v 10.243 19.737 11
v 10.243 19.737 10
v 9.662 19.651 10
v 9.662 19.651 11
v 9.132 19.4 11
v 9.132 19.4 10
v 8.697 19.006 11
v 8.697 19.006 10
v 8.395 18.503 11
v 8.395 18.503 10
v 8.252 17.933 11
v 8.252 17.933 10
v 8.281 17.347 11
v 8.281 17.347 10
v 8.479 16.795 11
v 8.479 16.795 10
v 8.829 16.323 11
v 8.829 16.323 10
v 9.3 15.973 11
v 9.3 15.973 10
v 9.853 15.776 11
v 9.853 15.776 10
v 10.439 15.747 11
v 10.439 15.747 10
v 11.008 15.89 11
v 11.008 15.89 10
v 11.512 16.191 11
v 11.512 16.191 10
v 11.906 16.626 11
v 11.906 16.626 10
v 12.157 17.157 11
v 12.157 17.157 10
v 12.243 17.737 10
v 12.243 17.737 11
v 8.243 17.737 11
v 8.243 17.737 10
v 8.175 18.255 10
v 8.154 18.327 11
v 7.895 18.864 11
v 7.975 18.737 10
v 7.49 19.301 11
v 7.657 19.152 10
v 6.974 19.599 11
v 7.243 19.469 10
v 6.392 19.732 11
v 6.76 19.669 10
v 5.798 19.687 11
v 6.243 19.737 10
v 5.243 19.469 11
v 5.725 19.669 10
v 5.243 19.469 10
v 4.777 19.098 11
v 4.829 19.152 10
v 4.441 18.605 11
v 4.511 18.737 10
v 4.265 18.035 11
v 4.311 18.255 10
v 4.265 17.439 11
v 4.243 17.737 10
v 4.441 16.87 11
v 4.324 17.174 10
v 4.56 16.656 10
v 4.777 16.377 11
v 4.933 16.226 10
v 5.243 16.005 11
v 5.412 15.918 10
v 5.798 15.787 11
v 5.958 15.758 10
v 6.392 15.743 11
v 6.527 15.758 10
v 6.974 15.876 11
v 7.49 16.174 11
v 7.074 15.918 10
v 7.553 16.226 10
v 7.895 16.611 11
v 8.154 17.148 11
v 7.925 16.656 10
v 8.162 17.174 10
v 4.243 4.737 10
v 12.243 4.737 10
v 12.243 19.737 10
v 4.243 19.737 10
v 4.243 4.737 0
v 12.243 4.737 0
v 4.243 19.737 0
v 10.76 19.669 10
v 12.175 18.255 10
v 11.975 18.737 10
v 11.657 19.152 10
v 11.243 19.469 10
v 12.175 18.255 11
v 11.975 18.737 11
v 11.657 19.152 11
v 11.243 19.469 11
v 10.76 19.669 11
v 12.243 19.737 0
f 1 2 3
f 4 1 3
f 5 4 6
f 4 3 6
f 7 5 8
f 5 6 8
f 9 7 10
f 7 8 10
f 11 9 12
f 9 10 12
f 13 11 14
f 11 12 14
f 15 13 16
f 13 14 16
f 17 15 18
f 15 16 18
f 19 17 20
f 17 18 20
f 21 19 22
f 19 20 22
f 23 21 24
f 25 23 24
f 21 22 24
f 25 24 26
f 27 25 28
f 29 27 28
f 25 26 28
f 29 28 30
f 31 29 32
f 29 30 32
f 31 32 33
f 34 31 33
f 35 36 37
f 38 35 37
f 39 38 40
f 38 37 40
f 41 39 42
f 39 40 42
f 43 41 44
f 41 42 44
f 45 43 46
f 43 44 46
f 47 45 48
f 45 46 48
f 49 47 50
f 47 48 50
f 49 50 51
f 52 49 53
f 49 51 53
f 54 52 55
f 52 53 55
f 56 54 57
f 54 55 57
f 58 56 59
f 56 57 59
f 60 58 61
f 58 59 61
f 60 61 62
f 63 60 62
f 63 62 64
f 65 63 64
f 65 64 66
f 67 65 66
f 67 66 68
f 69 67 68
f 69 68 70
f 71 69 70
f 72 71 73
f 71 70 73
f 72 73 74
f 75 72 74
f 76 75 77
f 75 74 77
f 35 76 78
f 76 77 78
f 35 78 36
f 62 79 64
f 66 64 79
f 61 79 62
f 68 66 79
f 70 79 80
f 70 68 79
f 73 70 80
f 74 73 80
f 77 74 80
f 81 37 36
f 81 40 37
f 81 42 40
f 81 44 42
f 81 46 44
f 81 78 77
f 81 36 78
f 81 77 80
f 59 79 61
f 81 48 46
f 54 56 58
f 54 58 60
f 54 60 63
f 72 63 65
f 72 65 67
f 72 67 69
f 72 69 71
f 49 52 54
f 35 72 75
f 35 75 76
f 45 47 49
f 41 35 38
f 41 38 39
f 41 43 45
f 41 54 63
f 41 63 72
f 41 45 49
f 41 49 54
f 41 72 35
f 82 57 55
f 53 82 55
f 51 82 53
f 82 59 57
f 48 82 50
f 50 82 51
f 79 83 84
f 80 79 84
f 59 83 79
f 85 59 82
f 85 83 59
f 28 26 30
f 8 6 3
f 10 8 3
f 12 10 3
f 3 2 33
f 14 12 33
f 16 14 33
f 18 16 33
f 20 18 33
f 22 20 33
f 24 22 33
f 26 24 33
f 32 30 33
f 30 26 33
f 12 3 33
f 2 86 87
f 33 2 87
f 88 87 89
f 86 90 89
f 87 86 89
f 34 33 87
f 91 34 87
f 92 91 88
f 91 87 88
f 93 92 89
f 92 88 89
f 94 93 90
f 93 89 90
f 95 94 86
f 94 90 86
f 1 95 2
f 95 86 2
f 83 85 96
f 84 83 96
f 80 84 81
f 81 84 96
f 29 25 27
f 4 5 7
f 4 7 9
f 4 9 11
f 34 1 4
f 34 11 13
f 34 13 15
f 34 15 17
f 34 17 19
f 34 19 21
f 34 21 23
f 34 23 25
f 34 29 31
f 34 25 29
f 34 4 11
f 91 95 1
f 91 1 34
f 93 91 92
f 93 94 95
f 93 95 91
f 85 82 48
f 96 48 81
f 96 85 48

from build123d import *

# Parameters (mm, degrees)
F0_W     = 8
F0_H     = 15
F1_DEPTH = 10
F2_R     = 2
F4_DEPTH = 1
F5_DEPTH = 1


with BuildPart() as f1:
    # F0 (on Top) → F1 (new body)
    with BuildSketch(Plane.XY):
        with Locations((8.242821, 12.237294)):
            Rectangle(F0_W, F0_H)
    extrude(amount=F1_DEPTH)

    # F2 (on face) → F4 (join)
    with BuildSketch(Plane.XY.offset(10)):
        with Locations((6.242821, 17.737294)):
            Circle(F2_R)
    extrude(amount=F4_DEPTH)


with BuildPart() as f5:
    # F3 (on face) → F5 (new body)
    with BuildSketch(Plane.XY.offset(10)):
        with BuildLine():
            ThreePointArc((10.242821, 19.737294), (8.828607, 16.32308), (12.242821, 17.737294))
            ThreePointArc((12.242821, 17.737294), (11.657034, 19.151508), (10.242821, 19.737294))
        make_face()
    extrude(amount=F5_DEPTH)


solid = Compound([f1.part, f5.part])
